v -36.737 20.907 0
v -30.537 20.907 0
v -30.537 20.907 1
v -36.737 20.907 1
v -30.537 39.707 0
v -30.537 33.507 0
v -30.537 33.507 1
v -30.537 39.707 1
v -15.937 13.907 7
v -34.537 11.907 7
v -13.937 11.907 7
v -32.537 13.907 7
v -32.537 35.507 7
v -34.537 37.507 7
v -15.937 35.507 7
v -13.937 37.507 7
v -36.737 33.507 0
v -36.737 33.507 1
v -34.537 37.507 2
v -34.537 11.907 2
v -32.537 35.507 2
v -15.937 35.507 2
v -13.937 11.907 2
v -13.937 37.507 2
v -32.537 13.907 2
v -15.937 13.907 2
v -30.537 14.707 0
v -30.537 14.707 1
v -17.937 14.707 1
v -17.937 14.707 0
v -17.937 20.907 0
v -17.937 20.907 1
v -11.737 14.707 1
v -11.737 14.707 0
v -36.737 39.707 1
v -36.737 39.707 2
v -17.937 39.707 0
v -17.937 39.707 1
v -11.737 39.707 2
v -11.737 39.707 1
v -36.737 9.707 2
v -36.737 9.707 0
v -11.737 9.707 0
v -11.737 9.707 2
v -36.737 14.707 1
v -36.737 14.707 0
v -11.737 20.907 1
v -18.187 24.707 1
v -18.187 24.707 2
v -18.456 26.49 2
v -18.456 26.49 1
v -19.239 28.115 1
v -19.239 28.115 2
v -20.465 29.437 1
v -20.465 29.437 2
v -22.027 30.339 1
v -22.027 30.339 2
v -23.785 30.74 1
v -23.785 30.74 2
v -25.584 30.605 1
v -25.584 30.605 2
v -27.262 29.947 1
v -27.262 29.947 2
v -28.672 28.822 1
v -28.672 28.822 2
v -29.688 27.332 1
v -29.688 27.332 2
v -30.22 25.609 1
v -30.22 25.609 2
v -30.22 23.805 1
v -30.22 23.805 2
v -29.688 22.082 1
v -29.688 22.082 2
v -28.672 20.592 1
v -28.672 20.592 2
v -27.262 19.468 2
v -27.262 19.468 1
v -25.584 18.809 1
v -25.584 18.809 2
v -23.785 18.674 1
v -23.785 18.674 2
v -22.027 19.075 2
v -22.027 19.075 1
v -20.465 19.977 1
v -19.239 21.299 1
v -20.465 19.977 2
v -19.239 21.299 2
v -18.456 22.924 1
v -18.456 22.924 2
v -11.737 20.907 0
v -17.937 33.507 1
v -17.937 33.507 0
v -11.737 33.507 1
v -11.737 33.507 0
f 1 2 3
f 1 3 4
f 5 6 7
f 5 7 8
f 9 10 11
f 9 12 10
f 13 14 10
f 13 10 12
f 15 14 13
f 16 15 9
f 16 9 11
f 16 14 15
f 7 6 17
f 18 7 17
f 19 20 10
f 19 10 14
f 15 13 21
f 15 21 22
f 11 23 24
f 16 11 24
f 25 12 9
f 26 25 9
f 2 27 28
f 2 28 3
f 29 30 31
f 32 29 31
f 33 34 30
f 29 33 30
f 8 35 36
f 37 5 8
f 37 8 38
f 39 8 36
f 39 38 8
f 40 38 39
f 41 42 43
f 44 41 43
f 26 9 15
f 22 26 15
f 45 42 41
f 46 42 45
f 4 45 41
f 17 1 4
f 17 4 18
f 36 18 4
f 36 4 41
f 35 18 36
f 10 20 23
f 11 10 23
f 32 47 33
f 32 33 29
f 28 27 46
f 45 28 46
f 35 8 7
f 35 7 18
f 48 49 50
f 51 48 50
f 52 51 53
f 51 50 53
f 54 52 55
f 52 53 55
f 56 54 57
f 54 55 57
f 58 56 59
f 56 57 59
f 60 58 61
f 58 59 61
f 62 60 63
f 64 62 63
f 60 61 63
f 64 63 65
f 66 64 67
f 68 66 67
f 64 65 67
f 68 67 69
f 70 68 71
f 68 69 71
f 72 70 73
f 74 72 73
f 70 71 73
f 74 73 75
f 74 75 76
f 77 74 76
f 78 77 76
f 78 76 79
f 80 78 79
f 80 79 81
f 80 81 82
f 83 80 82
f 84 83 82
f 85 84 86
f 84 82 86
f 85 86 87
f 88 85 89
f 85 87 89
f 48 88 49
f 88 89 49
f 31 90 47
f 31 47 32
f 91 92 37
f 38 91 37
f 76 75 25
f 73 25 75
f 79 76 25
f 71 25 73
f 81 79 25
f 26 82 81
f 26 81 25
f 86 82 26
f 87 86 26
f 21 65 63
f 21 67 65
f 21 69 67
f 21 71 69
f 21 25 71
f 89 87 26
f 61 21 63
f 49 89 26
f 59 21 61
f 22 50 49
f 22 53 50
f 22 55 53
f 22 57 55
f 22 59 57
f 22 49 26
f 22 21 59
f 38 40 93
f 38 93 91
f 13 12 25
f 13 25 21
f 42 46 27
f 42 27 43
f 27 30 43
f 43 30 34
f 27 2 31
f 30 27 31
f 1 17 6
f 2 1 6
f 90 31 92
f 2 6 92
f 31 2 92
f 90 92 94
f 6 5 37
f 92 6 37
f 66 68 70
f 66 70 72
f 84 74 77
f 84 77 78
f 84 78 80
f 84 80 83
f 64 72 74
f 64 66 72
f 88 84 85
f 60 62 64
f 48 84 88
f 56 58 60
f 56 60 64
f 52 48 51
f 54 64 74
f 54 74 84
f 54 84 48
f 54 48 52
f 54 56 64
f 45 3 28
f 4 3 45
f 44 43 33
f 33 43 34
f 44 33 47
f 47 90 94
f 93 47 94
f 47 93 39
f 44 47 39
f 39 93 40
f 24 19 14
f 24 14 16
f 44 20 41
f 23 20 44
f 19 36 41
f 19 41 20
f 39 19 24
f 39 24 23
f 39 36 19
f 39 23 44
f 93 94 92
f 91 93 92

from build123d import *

# Parameters (mm, degrees)
SKETCH_1_W          = 25
SKETCH_1_H          = 30
EXTRUDE_1_DEPTH     = 2
SKETCH_2_W          = 20.6
SKETCH_2_H          = 25.6
EXTRUDE_2_DEPTH     = 5
SKETCH_3_W          = 16.6
SKETCH_3_H          = 21.6
CUT_EXTRUDE_1_DEPTH = 5
SKETCH_4_W          = 6.2
SKETCH_4_H          = 6.2
CUT_EXTRUDE_2_DEPTH = 1
SKETCH_5_R          = 6.05
CUT_EXTRUDE_3_DEPTH = 1


with BuildPart() as part:
    # ｽｹｯﾁ1 → ﾎﾞｽ - 押し出し1 (new body)
    with BuildSketch(Plane.XY):
        with Locations((-24.237274581, 24.707142857)):
            Rectangle(SKETCH_1_W, SKETCH_1_H)
    extrude(amount=EXTRUDE_1_DEPTH)

    # ｽｹｯﾁ2 → ﾎﾞｽ - 押し出し2 (add)
    with BuildSketch(Plane.XY.offset(2)):
        with Locations((-24.237274581, 24.707142857)):
            Rectangle(SKETCH_2_W, SKETCH_2_H)
    extrude(amount=EXTRUDE_2_DEPTH)

    # ｽｹｯﾁ3 → ｶｯﾄ - 押し出し1 (cut)
    with BuildSketch(Plane.XY.offset(7)):
        with Locations((-24.237274581, 24.707142857)):
            Rectangle(SKETCH_3_W, SKETCH_3_H)
    extrude(amount=-CUT_EXTRUDE_1_DEPTH, mode=Mode.SUBTRACT)

    # ｽｹｯﾁ4 → ｶｯﾄ - 押し出し2 (cut)
    with BuildSketch(Plane(origin=(0, 0, 0), x_dir=(-1, 0, 0), z_dir=(0, 0, -1))):
        with Locations((14.837274581, 36.607142857)):
            Rectangle(SKETCH_4_W, SKETCH_4_H)
        with Locations((33.637274581, 36.607142857)):
            Rectangle(SKETCH_4_W, SKETCH_4_H)
        with Locations((33.637274581, 17.807142857)):
            Rectangle(SKETCH_4_W, SKETCH_4_H)
        with Locations((14.837274581, 17.807142857)):
            Rectangle(SKETCH_4_W, SKETCH_4_H)
    extrude(amount=-CUT_EXTRUDE_2_DEPTH, mode=Mode.SUBTRACT)

    # ｽｹｯﾁ5 → ｶｯﾄ - 押し出し3 (cut)
    with BuildSketch(Plane.XY.offset(2)):
        with Locations((-24.237274581, 24.707142857)):
            Circle(SKETCH_5_R)
    extrude(amount=-CUT_EXTRUDE_3_DEPTH, mode=Mode.SUBTRACT)


solid = part.part
